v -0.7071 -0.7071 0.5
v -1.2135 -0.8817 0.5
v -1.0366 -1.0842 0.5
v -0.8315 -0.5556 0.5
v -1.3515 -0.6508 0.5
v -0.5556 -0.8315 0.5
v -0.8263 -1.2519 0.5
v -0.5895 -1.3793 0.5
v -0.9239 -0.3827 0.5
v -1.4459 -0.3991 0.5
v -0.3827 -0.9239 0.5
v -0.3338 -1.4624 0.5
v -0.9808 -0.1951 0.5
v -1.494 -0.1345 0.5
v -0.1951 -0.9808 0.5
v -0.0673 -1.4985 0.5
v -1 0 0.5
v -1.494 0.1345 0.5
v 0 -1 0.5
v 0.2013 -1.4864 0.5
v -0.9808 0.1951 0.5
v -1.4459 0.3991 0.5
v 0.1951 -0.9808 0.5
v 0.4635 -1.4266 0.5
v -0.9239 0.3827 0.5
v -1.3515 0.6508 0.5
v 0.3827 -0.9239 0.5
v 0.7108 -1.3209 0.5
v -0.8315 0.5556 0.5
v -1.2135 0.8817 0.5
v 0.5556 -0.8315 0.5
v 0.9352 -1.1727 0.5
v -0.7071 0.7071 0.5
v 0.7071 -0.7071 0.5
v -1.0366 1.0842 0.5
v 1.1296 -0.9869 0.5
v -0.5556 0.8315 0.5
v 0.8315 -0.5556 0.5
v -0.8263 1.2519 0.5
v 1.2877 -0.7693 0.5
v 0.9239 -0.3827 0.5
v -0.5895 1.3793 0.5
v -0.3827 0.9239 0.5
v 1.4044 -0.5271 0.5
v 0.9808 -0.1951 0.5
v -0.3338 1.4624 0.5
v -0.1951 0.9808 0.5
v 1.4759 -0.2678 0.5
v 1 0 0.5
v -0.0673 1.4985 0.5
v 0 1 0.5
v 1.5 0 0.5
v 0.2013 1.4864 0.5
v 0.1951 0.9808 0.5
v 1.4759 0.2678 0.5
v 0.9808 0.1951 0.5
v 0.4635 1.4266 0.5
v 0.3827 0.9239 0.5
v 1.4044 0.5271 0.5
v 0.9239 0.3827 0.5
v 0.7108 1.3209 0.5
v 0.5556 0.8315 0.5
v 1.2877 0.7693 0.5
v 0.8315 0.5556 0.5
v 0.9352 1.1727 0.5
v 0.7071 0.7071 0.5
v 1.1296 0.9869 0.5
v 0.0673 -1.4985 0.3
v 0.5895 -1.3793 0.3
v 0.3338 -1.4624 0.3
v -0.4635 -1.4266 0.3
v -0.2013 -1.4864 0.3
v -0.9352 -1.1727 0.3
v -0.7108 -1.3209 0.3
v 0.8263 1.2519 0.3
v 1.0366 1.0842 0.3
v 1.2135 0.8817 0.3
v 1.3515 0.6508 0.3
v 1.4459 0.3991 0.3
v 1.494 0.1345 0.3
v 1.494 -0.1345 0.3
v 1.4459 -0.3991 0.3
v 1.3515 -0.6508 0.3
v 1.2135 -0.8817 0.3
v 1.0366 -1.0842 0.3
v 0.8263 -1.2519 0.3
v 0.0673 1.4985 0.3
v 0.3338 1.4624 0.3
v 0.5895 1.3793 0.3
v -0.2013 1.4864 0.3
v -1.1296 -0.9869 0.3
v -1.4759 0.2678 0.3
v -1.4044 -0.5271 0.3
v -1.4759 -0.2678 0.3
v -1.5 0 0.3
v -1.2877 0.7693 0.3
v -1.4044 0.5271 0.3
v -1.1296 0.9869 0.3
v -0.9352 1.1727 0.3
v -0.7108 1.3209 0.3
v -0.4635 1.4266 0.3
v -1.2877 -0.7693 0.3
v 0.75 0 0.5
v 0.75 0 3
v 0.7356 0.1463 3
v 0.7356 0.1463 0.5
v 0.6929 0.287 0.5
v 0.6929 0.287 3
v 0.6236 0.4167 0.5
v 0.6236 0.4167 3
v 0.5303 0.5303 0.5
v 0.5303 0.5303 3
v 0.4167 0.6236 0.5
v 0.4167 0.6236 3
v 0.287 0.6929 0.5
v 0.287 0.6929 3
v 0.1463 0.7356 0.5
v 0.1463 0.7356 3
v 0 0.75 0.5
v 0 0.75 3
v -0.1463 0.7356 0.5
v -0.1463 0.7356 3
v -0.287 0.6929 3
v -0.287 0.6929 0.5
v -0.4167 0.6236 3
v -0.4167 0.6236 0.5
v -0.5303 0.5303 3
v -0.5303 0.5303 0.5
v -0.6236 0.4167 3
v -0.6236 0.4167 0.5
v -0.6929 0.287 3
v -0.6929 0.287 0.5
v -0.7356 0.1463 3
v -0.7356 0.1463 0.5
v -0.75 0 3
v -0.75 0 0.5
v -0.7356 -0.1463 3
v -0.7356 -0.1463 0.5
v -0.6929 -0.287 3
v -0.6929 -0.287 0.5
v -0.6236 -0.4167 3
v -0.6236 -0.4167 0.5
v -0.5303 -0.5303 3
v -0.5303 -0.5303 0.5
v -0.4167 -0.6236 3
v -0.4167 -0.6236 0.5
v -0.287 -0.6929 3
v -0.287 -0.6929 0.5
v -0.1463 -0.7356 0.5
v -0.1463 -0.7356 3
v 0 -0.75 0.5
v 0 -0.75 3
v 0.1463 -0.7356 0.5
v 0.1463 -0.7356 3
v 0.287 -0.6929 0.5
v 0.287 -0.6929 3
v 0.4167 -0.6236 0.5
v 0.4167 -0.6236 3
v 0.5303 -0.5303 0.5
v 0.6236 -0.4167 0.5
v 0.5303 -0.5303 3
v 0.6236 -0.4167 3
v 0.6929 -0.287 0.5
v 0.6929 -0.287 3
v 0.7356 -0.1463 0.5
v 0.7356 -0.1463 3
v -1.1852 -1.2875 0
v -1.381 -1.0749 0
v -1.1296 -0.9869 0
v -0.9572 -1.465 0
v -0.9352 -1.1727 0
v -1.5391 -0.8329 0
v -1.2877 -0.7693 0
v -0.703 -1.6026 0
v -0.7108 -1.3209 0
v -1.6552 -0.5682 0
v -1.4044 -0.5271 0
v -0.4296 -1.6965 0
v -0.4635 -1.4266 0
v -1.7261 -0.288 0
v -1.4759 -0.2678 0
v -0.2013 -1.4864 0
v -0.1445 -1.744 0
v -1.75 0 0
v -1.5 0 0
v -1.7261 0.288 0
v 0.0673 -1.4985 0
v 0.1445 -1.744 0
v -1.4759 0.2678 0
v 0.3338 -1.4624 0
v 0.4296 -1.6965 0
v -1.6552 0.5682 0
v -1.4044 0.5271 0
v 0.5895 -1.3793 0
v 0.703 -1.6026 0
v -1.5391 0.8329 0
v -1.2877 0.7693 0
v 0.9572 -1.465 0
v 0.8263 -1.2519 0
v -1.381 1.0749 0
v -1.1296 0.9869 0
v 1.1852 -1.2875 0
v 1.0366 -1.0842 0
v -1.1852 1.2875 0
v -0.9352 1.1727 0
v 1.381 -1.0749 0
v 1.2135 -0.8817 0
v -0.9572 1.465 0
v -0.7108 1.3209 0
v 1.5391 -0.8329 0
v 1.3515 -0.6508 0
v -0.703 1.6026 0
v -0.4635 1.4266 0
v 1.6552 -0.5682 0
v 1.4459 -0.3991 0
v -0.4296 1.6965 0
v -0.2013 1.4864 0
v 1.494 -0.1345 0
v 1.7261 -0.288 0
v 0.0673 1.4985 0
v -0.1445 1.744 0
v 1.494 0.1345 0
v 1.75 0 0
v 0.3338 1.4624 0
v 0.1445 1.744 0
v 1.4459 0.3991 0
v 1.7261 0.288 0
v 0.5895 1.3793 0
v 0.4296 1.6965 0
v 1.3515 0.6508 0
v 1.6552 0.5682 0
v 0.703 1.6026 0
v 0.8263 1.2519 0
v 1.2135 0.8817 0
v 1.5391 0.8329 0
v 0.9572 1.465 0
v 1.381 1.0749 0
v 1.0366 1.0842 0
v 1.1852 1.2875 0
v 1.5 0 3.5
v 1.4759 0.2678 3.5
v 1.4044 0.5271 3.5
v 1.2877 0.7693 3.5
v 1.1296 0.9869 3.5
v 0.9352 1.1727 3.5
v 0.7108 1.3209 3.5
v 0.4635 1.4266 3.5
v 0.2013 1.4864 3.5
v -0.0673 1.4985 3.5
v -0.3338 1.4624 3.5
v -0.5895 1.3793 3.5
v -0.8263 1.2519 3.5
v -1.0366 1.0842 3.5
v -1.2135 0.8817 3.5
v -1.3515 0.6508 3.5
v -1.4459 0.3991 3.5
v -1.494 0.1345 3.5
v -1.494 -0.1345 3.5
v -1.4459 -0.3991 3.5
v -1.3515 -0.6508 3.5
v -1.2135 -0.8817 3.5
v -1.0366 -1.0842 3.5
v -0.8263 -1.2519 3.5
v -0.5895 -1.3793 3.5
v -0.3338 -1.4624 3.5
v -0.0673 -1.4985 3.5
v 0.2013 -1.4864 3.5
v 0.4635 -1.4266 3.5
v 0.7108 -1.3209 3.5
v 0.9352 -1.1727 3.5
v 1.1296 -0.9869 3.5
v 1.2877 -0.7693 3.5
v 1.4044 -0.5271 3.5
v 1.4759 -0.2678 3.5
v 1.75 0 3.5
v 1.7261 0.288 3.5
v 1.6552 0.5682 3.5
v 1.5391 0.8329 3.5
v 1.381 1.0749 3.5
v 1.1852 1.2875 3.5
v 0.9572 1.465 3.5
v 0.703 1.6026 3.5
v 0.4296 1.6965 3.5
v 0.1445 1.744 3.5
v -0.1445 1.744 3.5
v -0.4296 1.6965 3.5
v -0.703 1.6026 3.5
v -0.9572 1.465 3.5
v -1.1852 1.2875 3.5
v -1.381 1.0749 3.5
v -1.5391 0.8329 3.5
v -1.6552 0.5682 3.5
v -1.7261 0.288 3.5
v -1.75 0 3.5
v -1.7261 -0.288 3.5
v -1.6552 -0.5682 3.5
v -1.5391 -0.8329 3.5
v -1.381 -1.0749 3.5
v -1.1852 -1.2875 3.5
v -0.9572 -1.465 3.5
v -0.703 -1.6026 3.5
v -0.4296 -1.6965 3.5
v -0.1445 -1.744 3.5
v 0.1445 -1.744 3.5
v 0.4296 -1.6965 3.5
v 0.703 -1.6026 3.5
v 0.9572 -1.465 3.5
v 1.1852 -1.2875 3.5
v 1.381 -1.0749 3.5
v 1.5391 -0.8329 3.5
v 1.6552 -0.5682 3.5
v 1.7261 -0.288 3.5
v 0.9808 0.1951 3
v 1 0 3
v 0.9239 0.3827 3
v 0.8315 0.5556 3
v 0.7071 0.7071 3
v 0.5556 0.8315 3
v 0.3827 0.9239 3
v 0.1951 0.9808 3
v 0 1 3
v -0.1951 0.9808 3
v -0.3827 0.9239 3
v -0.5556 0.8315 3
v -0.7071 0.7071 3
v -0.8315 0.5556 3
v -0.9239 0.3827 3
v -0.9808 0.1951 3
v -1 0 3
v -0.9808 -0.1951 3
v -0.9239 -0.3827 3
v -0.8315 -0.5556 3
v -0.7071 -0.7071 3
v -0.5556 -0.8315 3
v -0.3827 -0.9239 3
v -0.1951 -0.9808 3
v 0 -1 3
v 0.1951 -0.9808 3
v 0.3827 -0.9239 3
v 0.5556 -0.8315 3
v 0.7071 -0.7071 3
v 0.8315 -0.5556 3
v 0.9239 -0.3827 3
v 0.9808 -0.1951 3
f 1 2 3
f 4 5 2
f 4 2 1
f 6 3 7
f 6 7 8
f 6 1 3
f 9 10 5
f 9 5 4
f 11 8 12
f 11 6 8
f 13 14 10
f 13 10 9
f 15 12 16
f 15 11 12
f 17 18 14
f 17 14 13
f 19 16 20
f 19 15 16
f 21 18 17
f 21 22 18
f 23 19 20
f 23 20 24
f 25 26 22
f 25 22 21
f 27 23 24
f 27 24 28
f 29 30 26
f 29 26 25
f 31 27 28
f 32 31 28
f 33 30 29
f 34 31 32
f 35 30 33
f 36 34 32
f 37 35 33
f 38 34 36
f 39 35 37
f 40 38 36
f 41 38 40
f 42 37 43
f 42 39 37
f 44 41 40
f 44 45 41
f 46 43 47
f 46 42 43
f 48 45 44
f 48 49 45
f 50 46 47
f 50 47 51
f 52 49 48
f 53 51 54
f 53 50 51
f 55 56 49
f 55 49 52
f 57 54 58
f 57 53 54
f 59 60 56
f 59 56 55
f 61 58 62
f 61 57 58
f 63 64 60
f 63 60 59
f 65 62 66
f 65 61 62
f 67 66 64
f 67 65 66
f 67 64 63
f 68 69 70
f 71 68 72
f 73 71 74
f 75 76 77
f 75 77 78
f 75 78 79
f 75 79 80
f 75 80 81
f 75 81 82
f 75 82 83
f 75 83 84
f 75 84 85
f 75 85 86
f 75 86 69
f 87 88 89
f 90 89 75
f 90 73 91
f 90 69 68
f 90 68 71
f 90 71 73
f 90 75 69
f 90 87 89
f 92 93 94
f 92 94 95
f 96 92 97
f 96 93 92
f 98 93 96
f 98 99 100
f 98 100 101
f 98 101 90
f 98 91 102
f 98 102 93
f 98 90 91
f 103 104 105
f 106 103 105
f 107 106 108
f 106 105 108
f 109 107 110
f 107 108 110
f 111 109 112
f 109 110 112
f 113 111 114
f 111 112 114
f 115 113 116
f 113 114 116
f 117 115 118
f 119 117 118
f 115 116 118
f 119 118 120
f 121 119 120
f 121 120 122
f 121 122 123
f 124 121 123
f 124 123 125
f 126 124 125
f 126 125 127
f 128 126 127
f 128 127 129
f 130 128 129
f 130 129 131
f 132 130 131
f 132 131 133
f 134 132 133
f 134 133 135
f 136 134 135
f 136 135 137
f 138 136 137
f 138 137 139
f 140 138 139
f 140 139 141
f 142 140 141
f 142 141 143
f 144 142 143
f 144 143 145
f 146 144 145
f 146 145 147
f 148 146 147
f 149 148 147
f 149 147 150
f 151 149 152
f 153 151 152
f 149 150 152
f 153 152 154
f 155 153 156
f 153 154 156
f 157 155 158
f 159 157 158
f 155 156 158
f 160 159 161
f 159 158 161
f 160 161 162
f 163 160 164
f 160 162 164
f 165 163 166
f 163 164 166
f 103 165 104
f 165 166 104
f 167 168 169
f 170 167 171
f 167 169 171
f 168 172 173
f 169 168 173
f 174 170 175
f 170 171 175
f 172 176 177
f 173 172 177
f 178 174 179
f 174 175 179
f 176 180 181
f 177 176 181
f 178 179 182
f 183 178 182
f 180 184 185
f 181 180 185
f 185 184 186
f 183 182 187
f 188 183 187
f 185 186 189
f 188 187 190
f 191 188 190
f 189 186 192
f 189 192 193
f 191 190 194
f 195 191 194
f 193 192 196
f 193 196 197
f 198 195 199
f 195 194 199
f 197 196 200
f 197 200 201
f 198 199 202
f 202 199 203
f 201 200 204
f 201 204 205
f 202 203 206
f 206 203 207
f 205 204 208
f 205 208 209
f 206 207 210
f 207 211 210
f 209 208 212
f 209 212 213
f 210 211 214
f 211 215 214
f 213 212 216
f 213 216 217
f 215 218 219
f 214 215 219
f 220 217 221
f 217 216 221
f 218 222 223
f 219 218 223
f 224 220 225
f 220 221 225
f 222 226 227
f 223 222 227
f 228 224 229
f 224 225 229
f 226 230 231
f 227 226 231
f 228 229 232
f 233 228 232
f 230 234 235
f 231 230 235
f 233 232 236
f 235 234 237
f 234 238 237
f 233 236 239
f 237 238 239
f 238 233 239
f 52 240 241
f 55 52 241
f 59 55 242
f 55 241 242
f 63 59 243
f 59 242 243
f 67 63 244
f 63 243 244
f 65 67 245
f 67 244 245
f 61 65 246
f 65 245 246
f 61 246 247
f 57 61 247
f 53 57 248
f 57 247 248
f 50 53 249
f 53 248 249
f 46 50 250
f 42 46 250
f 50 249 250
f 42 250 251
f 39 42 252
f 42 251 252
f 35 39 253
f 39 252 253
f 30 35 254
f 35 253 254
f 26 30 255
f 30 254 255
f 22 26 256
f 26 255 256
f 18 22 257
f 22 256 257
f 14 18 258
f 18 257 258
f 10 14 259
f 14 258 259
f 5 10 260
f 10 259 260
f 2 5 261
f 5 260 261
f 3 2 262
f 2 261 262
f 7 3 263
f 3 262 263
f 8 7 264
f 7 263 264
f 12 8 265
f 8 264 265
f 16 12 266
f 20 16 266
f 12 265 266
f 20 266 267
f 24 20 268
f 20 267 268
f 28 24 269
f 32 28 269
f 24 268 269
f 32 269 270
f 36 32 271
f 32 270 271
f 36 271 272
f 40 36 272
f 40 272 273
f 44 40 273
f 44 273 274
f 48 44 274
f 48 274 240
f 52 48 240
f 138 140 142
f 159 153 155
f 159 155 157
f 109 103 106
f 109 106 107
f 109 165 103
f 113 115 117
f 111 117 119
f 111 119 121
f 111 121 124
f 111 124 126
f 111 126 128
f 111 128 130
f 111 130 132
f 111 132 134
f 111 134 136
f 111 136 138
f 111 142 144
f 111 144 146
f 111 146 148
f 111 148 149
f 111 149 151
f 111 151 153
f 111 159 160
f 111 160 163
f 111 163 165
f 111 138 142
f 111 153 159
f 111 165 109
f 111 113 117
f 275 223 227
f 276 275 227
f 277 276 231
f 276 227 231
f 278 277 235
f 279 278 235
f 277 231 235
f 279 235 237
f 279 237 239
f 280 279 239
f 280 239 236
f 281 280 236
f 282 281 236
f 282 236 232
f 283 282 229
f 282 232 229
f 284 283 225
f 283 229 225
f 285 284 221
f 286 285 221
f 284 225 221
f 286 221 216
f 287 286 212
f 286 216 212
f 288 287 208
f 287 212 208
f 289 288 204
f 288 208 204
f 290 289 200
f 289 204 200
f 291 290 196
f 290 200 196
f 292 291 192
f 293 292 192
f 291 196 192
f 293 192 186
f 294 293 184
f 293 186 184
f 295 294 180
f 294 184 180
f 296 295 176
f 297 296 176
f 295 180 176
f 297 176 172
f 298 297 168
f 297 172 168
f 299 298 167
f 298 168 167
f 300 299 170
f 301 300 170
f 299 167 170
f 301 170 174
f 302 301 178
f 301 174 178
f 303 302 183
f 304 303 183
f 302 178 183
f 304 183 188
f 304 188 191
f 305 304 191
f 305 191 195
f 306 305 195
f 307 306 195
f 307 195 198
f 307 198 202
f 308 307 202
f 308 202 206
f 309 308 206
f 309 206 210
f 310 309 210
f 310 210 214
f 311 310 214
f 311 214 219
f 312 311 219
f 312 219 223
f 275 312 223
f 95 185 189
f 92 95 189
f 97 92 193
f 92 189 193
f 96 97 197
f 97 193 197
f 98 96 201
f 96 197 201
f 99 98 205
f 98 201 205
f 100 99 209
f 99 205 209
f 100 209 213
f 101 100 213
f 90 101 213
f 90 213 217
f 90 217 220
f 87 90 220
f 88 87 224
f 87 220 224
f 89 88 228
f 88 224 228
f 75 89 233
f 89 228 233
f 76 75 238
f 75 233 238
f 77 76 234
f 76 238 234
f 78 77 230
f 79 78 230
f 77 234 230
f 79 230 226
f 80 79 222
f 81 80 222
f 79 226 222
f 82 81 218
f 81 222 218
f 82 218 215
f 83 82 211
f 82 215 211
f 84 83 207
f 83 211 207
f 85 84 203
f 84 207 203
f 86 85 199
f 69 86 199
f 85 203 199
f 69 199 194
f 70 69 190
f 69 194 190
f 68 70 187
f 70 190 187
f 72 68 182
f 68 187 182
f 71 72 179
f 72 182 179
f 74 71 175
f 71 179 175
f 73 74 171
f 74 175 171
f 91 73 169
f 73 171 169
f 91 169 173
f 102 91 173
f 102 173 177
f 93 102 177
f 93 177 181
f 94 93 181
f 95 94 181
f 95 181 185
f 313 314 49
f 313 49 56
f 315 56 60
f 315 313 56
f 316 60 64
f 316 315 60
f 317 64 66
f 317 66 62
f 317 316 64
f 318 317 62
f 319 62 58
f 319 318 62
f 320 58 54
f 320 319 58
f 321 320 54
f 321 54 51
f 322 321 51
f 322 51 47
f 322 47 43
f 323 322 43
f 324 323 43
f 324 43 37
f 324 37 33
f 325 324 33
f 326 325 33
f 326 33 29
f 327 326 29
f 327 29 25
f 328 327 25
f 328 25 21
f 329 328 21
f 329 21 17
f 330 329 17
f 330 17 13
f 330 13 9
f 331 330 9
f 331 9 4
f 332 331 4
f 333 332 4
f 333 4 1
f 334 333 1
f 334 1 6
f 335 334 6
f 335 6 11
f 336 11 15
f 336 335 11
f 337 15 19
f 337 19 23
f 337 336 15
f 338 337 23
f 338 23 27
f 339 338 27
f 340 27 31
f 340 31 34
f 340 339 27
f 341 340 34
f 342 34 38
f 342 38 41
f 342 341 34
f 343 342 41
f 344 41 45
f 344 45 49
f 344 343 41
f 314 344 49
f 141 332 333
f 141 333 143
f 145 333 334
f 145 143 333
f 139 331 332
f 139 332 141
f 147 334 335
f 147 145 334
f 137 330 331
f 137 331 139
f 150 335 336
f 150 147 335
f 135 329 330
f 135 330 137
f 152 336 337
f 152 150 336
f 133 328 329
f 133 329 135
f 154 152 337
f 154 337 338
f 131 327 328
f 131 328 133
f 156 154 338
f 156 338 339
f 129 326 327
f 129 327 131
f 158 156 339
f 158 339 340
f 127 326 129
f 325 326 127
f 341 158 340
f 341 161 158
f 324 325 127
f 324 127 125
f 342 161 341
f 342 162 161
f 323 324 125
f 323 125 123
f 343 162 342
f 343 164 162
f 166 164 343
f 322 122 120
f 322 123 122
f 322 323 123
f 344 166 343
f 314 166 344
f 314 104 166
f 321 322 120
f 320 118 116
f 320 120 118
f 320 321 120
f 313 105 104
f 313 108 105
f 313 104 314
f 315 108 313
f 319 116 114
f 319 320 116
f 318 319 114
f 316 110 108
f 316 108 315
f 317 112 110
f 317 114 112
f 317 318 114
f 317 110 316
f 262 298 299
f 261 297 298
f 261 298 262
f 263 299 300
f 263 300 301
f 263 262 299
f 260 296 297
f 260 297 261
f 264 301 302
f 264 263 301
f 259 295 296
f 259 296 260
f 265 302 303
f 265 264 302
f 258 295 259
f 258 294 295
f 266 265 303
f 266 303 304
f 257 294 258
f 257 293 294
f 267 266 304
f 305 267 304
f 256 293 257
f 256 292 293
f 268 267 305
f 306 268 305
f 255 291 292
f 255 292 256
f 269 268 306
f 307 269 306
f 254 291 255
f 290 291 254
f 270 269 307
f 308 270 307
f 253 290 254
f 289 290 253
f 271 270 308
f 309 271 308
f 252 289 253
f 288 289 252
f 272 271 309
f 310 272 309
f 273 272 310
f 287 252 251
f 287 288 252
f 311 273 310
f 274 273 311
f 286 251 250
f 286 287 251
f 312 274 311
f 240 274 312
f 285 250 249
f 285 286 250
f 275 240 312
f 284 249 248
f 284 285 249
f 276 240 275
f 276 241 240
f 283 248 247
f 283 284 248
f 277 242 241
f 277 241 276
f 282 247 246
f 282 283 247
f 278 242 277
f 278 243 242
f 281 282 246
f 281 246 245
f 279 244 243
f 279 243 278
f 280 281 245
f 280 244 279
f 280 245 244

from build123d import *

# Parameters (mm, degrees)
SKETCH3_R           = 1.75
BOSS_EXTRUDE1_DEPTH = 3.5
SKETCH4_R           = 0.75
CUT_EXTRUDE1_DEPTH  = 3
SKETCH6_R           = 1.5
SKETCH6_R_2         = 1
CUT_EXTRUDE6_DEPTH  = 3
SKETCH10_R          = 1
CUT_EXTRUDE7_DEPTH  = 0.5
SKETCH12_R          = 1.5
CUT_EXTRUDE8_DEPTH  = 0.3


with BuildPart() as part:
    # Sketch3 → Boss-Extrude1 (new body)
    with BuildSketch(Plane.XY):
        Circle(SKETCH3_R)
    extrude(amount=BOSS_EXTRUDE1_DEPTH)

    # Sketch4 → Cut-Extrude1 (cut)
    with BuildSketch(Plane.XY.offset(3.5)):
        Circle(SKETCH4_R)
    extrude(amount=-CUT_EXTRUDE1_DEPTH, mode=Mode.SUBTRACT)

    # Sketch6 → Cut-Extrude6 (cut)
    with BuildSketch(Plane.XY.offset(3.5)):
        Circle(SKETCH6_R)
        Circle(SKETCH6_R_2, mode=Mode.SUBTRACT)
    extrude(amount=-CUT_EXTRUDE6_DEPTH, mode=Mode.SUBTRACT)

    # Sketch10 → Cut-Extrude7 (cut)
    with BuildSketch(Plane.XY.offset(3.5)):
        Circle(SKETCH10_R)
    extrude(amount=-CUT_EXTRUDE7_DEPTH, mode=Mode.SUBTRACT)

    # Sketch12 → Cut-Extrude8 (cut)
    with BuildSketch(Plane(origin=(0, 0, 0), x_dir=(-1, 0, 0), z_dir=(0, 0, -1))):
        Circle(SKETCH12_R)
    extrude(amount=-CUT_EXTRUDE8_DEPTH, mode=Mode.SUBTRACT)


solid = part.part
